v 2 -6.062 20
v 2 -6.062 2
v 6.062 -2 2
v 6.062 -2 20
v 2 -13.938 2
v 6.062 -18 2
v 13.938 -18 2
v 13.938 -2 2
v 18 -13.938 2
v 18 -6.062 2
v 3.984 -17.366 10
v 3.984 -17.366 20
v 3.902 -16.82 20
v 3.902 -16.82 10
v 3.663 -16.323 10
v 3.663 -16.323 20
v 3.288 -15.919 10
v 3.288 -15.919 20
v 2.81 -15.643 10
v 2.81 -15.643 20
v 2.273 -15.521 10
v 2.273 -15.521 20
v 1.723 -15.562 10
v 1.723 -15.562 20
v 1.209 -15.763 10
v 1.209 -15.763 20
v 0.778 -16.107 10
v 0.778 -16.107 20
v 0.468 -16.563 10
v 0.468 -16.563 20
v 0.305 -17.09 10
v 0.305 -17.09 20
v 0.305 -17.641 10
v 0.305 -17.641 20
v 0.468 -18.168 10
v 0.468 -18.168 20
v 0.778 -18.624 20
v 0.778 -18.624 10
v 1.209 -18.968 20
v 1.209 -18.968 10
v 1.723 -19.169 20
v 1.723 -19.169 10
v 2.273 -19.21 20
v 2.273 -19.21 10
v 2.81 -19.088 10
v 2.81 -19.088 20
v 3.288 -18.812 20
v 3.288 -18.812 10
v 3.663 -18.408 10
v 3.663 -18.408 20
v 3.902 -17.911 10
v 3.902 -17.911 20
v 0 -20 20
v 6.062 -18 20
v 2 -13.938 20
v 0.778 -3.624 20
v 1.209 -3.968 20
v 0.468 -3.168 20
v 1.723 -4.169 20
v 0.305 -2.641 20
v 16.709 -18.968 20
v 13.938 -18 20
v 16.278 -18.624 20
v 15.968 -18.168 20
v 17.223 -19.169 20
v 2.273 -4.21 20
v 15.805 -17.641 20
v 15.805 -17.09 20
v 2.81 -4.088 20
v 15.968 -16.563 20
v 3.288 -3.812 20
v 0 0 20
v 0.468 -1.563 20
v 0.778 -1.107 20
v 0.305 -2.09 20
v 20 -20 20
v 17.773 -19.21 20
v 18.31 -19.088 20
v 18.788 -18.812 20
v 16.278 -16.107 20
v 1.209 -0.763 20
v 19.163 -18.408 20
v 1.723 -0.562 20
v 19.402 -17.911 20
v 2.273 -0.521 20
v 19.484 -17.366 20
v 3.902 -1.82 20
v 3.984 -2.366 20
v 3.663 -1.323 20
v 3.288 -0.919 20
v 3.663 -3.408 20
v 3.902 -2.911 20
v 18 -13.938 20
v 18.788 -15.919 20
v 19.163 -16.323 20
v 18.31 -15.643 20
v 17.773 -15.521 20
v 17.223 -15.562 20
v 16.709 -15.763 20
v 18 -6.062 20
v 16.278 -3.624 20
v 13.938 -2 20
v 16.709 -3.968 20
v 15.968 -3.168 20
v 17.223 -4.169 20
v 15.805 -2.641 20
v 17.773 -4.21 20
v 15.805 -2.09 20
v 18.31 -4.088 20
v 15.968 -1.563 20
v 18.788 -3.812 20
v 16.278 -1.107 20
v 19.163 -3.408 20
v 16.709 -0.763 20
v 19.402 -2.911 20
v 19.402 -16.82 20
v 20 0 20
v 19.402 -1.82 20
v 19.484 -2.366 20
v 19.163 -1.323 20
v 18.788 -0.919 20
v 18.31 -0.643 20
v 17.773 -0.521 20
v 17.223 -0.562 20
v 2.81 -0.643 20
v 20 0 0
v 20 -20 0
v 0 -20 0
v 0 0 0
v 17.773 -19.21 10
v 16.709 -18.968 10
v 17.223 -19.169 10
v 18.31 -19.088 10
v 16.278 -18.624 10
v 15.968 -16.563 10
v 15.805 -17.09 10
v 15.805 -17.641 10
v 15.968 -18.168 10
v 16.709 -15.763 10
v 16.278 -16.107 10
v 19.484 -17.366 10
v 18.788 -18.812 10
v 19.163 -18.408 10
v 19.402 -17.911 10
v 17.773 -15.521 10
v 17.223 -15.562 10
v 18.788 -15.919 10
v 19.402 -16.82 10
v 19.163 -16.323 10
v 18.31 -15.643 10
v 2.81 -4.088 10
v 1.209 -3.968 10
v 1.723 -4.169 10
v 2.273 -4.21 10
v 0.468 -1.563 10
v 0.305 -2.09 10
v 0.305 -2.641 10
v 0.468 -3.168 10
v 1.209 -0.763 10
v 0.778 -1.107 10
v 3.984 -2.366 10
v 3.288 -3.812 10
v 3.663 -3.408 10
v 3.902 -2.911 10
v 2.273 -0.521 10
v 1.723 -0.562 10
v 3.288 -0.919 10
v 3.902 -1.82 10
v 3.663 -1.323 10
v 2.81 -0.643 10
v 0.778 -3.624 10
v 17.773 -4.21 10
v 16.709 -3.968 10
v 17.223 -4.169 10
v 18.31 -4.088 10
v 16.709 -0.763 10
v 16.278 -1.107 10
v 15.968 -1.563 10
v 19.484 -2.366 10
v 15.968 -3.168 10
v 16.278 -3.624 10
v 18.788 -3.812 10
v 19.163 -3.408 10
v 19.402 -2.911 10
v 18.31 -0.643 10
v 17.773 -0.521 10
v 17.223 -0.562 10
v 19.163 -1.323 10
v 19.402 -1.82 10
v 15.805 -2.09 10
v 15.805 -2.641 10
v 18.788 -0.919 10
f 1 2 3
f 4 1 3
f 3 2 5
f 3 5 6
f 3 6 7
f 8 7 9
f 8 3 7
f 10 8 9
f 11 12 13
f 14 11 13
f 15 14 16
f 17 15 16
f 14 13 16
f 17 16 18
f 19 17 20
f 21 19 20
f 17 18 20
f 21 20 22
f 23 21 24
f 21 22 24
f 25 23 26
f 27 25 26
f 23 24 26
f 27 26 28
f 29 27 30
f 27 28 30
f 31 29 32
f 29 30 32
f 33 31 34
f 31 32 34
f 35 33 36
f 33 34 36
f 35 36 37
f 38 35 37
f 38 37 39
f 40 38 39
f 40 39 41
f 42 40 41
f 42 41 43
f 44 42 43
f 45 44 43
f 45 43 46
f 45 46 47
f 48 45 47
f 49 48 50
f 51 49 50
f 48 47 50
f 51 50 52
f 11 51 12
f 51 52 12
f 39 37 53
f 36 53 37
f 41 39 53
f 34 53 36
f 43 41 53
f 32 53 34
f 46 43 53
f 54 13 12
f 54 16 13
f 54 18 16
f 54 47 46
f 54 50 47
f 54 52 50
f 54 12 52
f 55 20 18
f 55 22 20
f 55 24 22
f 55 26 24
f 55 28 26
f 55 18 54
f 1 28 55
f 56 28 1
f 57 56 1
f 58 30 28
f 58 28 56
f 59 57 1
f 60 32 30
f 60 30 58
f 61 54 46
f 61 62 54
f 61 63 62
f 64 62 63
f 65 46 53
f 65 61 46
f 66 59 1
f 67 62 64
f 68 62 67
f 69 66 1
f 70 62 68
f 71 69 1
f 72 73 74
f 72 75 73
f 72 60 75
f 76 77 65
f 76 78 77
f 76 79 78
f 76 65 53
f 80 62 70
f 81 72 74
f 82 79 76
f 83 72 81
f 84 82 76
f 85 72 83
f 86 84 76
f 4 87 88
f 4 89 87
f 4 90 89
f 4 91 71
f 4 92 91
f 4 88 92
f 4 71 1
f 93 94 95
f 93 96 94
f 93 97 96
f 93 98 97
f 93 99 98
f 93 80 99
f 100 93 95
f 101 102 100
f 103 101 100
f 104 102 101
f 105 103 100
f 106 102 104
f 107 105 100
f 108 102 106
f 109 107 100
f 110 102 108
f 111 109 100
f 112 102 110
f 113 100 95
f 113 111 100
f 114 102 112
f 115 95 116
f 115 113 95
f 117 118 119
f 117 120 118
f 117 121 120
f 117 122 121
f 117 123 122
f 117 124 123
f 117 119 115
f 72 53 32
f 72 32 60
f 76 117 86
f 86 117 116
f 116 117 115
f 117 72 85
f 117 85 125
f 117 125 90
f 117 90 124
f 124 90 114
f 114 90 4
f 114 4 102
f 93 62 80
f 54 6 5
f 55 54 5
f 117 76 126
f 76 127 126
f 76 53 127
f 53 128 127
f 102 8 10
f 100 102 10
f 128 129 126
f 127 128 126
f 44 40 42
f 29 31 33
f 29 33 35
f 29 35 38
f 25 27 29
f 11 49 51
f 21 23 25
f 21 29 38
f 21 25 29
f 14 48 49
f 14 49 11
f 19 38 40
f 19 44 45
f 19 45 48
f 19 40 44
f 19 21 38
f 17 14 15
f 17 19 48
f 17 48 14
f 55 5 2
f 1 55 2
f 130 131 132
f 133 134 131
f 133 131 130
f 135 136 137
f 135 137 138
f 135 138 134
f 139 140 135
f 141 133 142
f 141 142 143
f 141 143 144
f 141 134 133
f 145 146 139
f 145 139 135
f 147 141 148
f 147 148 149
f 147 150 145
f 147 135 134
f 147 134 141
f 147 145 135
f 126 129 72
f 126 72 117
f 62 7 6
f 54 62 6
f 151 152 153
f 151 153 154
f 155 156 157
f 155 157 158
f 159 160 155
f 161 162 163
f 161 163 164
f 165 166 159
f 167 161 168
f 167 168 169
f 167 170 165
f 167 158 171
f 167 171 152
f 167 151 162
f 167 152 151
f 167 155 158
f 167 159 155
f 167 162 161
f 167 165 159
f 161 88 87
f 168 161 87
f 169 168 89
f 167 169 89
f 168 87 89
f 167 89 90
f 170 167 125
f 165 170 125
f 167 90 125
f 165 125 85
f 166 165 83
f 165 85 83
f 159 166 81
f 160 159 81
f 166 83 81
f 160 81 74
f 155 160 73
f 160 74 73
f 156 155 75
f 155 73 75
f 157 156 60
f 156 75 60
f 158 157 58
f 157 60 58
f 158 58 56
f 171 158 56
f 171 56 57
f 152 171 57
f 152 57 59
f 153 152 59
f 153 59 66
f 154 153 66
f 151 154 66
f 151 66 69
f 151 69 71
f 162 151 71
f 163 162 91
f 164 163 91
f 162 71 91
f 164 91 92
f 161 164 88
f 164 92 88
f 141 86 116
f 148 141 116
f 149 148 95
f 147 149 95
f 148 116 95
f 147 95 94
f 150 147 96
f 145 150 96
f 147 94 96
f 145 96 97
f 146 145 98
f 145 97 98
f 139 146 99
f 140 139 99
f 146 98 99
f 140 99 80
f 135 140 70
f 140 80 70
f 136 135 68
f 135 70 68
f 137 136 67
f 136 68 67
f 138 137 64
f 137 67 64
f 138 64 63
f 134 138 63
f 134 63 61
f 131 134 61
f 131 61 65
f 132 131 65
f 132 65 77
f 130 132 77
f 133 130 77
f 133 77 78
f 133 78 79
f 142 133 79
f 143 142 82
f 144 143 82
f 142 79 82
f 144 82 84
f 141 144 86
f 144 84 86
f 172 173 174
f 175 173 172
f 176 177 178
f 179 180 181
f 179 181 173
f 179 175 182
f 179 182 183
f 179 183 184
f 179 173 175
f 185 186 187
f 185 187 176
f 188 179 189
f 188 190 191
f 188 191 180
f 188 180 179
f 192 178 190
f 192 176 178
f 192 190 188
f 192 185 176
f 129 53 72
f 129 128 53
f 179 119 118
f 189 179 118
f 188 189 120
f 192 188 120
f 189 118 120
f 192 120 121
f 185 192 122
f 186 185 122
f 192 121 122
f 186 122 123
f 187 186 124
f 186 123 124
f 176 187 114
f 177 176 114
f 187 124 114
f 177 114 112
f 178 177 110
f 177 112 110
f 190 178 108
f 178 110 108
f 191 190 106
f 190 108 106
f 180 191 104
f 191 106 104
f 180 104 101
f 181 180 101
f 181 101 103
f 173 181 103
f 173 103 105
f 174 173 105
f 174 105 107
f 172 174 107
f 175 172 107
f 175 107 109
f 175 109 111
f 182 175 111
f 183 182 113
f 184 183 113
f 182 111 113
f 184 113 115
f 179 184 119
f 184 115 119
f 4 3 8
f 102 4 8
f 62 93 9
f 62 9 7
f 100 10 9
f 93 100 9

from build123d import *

# Parameters (mm, degrees)
F2_W     = 20
F2_H     = 20
F3_DEPTH = 2
F4_W     = 20
F4_H     = 20
F5_DEPTH = 18
F6_R     = 1.85
F7_DEPTH = 10


with BuildPart() as f3:
    # F2 (on Top) → F3 (new body)
    with BuildSketch(Plane.XY):
        with Locations((10, -10)):
            Rectangle(F2_W, F2_H)
    extrude(amount=F3_DEPTH)

    # F4 (on face) → F5 (join)
    with BuildSketch(Plane.XY.offset(2)):
        with Locations((10, -10)):
            Rectangle(F4_W, F4_H)
        Polygon((2, -6.06223871), (2, -2), (6.06223871, -2), (13.93776129, -2), (18, -2), (18, -6.06223871), (18, -13.93776129), (18, -18), (13.93776129, -18), (6.06223871, -18), (2, -18), (2, -13.93776129), align=None, mode=Mode.SUBTRACT)
        Polygon((6.06223871, -2), (2, -2), (2, -6.06223871), align=None)
        Polygon((18, -2), (13.93776129, -2), (18, -6.06223871), align=None)
        Polygon((18, -18), (18, -13.93776129), (13.93776129, -18), align=None)
        Polygon((6.06223871, -18), (2, -13.93776129), (2, -18), align=None)
    extrude(amount=F5_DEPTH)

    # F6 (on face) → F7 (cut)
    with BuildSketch(Plane.XY.offset(20)):
        with Locations((2.1344347065, -2.3655652935)):
            Circle(F6_R)
        with Locations((17.6344347065, -2.3655652935)):
            Circle(F6_R)
        with Locations((17.6344347065, -17.3655652935)):
            Circle(F6_R)
        with Locations((2.1344347065, -17.3655652935)):
            Circle(F6_R)
    extrude(amount=-F7_DEPTH, mode=Mode.SUBTRACT)


solid = f3.part
